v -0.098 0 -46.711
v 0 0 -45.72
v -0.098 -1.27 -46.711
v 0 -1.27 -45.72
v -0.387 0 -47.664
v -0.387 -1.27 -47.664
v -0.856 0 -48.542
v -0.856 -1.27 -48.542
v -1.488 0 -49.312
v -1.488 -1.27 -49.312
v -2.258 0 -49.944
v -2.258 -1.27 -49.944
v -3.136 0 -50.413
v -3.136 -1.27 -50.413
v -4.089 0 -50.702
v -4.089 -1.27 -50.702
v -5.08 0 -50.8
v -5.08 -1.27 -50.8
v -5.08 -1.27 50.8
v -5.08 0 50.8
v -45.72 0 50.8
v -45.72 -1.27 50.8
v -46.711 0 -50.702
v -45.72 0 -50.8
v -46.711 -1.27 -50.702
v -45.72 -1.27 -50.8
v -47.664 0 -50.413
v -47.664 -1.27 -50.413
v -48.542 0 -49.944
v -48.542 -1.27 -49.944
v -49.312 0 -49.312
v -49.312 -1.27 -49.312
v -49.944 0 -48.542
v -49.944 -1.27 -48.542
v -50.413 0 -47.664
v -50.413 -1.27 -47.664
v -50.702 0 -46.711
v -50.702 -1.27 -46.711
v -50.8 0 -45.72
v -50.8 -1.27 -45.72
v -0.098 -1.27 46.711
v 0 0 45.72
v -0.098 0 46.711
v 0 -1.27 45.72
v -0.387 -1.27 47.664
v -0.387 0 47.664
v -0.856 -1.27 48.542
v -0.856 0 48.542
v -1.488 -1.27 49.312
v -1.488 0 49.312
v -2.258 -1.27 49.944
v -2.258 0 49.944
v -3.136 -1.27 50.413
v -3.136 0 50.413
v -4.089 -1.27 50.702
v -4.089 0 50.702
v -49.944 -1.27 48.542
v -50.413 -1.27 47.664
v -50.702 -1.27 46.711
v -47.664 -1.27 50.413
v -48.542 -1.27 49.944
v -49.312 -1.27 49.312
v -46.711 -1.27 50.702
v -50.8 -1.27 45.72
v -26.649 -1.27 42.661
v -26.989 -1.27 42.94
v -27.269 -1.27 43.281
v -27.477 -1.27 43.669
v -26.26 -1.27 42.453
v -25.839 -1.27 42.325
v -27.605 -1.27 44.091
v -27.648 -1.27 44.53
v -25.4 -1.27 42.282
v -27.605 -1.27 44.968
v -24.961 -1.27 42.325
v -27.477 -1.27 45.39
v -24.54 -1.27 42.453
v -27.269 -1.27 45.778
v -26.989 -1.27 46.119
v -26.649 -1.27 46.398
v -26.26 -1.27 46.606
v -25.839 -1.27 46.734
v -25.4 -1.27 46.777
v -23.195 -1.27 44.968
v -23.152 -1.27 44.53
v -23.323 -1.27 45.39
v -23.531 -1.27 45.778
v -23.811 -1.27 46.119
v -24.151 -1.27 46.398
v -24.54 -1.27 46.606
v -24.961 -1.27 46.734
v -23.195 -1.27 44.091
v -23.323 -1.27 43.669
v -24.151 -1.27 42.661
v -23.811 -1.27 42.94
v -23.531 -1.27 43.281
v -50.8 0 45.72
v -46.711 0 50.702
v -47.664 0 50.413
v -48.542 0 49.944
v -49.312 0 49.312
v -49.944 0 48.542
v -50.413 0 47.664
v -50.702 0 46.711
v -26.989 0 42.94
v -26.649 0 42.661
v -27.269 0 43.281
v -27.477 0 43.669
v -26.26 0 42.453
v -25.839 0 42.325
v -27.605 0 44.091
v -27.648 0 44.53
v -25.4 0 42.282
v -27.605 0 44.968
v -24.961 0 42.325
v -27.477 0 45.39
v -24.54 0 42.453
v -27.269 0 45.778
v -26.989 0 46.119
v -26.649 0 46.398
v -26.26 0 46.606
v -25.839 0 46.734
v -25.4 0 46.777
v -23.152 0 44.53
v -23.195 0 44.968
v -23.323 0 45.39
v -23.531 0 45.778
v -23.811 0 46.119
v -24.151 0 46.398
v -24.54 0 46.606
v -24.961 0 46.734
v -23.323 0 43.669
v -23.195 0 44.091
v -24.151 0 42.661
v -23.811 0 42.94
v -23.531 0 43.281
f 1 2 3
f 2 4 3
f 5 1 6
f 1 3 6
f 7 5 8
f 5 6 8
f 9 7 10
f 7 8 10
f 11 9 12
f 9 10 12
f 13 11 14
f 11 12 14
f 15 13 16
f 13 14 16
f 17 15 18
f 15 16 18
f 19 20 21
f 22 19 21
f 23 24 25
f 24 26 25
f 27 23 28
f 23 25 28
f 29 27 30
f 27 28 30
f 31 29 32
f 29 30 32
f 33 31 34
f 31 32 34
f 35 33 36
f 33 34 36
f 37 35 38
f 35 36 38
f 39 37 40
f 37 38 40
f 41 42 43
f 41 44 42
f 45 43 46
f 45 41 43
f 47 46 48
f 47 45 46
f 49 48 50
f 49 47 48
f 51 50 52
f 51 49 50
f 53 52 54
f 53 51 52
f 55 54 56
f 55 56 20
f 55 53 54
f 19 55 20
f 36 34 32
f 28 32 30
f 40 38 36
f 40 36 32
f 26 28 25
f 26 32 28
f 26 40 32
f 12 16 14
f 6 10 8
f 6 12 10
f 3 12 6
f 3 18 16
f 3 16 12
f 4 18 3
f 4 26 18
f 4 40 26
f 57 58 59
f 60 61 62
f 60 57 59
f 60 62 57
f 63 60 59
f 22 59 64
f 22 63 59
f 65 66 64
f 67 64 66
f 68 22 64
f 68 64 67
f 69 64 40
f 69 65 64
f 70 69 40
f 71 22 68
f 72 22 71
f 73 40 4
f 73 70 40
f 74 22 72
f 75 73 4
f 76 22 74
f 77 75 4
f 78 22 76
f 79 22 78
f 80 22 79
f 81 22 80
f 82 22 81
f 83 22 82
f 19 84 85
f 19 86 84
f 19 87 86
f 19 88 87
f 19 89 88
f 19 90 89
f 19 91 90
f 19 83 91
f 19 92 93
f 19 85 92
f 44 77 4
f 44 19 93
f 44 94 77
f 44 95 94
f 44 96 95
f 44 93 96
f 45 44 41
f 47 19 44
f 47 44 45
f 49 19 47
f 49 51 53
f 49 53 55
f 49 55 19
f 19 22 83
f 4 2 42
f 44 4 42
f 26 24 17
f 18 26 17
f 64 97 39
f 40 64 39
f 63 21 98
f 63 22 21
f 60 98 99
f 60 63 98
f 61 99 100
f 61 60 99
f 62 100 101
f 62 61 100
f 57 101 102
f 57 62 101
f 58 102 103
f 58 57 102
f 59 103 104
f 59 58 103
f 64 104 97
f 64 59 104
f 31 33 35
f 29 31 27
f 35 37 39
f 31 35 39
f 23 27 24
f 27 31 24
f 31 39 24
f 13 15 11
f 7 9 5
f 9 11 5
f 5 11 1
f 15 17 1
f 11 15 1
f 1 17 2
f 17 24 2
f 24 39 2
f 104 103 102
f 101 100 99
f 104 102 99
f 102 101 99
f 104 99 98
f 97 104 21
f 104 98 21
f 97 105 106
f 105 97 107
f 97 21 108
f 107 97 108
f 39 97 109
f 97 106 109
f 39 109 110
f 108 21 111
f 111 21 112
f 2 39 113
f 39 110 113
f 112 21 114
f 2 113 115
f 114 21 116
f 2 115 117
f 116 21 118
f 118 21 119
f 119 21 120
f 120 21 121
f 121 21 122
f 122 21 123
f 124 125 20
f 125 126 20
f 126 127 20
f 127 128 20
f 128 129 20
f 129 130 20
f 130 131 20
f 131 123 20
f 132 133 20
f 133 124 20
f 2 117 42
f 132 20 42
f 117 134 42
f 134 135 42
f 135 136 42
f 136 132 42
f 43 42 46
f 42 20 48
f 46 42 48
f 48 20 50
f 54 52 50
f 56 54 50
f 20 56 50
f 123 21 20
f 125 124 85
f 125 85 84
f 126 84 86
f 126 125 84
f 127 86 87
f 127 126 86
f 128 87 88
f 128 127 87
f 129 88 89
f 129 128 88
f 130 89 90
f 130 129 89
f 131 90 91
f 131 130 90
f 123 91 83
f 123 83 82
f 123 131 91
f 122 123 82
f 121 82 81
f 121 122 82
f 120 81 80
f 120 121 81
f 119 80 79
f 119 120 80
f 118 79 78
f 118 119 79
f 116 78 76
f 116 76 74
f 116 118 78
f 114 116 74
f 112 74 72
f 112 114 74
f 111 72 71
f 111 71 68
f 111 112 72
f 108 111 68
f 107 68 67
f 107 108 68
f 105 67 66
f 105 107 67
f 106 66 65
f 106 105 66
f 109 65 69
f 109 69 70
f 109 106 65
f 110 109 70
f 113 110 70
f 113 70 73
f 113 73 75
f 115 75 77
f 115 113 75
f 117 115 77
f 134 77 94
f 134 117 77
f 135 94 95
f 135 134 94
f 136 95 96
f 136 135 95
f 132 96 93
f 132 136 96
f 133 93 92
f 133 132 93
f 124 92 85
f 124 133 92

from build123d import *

# Parameters (mm, degrees)
F0_R     = 2.247709
F1_DEPTH = 1.27
F2_R     = 5.08


with BuildPart() as f1:
    # F0 (on Front) → F1 (new body)
    with BuildSketch(Plane.XZ):
        Polygon((0, -50.8), (0, 0), (0, 50.8), (-50.8, 50.8), (-50.8, 0), (-50.8, -50.8), align=None)
        with Locations((-25.4, 44.52955)):
            Circle(F0_R, mode=Mode.SUBTRACT)
    extrude(amount=F1_DEPTH)

    # F2
    f2_edges = [f1.edges().sort_by_distance(p)[0] for p in [
        (0, -0.635, 50.8),
        (-50.8, -0.635, 50.8),
        (-50.8, -0.635, -50.8),
        (0, -0.635, -50.8),
    ]]
    fillet(f2_edges, radius=F2_R)


solid = f1.part
